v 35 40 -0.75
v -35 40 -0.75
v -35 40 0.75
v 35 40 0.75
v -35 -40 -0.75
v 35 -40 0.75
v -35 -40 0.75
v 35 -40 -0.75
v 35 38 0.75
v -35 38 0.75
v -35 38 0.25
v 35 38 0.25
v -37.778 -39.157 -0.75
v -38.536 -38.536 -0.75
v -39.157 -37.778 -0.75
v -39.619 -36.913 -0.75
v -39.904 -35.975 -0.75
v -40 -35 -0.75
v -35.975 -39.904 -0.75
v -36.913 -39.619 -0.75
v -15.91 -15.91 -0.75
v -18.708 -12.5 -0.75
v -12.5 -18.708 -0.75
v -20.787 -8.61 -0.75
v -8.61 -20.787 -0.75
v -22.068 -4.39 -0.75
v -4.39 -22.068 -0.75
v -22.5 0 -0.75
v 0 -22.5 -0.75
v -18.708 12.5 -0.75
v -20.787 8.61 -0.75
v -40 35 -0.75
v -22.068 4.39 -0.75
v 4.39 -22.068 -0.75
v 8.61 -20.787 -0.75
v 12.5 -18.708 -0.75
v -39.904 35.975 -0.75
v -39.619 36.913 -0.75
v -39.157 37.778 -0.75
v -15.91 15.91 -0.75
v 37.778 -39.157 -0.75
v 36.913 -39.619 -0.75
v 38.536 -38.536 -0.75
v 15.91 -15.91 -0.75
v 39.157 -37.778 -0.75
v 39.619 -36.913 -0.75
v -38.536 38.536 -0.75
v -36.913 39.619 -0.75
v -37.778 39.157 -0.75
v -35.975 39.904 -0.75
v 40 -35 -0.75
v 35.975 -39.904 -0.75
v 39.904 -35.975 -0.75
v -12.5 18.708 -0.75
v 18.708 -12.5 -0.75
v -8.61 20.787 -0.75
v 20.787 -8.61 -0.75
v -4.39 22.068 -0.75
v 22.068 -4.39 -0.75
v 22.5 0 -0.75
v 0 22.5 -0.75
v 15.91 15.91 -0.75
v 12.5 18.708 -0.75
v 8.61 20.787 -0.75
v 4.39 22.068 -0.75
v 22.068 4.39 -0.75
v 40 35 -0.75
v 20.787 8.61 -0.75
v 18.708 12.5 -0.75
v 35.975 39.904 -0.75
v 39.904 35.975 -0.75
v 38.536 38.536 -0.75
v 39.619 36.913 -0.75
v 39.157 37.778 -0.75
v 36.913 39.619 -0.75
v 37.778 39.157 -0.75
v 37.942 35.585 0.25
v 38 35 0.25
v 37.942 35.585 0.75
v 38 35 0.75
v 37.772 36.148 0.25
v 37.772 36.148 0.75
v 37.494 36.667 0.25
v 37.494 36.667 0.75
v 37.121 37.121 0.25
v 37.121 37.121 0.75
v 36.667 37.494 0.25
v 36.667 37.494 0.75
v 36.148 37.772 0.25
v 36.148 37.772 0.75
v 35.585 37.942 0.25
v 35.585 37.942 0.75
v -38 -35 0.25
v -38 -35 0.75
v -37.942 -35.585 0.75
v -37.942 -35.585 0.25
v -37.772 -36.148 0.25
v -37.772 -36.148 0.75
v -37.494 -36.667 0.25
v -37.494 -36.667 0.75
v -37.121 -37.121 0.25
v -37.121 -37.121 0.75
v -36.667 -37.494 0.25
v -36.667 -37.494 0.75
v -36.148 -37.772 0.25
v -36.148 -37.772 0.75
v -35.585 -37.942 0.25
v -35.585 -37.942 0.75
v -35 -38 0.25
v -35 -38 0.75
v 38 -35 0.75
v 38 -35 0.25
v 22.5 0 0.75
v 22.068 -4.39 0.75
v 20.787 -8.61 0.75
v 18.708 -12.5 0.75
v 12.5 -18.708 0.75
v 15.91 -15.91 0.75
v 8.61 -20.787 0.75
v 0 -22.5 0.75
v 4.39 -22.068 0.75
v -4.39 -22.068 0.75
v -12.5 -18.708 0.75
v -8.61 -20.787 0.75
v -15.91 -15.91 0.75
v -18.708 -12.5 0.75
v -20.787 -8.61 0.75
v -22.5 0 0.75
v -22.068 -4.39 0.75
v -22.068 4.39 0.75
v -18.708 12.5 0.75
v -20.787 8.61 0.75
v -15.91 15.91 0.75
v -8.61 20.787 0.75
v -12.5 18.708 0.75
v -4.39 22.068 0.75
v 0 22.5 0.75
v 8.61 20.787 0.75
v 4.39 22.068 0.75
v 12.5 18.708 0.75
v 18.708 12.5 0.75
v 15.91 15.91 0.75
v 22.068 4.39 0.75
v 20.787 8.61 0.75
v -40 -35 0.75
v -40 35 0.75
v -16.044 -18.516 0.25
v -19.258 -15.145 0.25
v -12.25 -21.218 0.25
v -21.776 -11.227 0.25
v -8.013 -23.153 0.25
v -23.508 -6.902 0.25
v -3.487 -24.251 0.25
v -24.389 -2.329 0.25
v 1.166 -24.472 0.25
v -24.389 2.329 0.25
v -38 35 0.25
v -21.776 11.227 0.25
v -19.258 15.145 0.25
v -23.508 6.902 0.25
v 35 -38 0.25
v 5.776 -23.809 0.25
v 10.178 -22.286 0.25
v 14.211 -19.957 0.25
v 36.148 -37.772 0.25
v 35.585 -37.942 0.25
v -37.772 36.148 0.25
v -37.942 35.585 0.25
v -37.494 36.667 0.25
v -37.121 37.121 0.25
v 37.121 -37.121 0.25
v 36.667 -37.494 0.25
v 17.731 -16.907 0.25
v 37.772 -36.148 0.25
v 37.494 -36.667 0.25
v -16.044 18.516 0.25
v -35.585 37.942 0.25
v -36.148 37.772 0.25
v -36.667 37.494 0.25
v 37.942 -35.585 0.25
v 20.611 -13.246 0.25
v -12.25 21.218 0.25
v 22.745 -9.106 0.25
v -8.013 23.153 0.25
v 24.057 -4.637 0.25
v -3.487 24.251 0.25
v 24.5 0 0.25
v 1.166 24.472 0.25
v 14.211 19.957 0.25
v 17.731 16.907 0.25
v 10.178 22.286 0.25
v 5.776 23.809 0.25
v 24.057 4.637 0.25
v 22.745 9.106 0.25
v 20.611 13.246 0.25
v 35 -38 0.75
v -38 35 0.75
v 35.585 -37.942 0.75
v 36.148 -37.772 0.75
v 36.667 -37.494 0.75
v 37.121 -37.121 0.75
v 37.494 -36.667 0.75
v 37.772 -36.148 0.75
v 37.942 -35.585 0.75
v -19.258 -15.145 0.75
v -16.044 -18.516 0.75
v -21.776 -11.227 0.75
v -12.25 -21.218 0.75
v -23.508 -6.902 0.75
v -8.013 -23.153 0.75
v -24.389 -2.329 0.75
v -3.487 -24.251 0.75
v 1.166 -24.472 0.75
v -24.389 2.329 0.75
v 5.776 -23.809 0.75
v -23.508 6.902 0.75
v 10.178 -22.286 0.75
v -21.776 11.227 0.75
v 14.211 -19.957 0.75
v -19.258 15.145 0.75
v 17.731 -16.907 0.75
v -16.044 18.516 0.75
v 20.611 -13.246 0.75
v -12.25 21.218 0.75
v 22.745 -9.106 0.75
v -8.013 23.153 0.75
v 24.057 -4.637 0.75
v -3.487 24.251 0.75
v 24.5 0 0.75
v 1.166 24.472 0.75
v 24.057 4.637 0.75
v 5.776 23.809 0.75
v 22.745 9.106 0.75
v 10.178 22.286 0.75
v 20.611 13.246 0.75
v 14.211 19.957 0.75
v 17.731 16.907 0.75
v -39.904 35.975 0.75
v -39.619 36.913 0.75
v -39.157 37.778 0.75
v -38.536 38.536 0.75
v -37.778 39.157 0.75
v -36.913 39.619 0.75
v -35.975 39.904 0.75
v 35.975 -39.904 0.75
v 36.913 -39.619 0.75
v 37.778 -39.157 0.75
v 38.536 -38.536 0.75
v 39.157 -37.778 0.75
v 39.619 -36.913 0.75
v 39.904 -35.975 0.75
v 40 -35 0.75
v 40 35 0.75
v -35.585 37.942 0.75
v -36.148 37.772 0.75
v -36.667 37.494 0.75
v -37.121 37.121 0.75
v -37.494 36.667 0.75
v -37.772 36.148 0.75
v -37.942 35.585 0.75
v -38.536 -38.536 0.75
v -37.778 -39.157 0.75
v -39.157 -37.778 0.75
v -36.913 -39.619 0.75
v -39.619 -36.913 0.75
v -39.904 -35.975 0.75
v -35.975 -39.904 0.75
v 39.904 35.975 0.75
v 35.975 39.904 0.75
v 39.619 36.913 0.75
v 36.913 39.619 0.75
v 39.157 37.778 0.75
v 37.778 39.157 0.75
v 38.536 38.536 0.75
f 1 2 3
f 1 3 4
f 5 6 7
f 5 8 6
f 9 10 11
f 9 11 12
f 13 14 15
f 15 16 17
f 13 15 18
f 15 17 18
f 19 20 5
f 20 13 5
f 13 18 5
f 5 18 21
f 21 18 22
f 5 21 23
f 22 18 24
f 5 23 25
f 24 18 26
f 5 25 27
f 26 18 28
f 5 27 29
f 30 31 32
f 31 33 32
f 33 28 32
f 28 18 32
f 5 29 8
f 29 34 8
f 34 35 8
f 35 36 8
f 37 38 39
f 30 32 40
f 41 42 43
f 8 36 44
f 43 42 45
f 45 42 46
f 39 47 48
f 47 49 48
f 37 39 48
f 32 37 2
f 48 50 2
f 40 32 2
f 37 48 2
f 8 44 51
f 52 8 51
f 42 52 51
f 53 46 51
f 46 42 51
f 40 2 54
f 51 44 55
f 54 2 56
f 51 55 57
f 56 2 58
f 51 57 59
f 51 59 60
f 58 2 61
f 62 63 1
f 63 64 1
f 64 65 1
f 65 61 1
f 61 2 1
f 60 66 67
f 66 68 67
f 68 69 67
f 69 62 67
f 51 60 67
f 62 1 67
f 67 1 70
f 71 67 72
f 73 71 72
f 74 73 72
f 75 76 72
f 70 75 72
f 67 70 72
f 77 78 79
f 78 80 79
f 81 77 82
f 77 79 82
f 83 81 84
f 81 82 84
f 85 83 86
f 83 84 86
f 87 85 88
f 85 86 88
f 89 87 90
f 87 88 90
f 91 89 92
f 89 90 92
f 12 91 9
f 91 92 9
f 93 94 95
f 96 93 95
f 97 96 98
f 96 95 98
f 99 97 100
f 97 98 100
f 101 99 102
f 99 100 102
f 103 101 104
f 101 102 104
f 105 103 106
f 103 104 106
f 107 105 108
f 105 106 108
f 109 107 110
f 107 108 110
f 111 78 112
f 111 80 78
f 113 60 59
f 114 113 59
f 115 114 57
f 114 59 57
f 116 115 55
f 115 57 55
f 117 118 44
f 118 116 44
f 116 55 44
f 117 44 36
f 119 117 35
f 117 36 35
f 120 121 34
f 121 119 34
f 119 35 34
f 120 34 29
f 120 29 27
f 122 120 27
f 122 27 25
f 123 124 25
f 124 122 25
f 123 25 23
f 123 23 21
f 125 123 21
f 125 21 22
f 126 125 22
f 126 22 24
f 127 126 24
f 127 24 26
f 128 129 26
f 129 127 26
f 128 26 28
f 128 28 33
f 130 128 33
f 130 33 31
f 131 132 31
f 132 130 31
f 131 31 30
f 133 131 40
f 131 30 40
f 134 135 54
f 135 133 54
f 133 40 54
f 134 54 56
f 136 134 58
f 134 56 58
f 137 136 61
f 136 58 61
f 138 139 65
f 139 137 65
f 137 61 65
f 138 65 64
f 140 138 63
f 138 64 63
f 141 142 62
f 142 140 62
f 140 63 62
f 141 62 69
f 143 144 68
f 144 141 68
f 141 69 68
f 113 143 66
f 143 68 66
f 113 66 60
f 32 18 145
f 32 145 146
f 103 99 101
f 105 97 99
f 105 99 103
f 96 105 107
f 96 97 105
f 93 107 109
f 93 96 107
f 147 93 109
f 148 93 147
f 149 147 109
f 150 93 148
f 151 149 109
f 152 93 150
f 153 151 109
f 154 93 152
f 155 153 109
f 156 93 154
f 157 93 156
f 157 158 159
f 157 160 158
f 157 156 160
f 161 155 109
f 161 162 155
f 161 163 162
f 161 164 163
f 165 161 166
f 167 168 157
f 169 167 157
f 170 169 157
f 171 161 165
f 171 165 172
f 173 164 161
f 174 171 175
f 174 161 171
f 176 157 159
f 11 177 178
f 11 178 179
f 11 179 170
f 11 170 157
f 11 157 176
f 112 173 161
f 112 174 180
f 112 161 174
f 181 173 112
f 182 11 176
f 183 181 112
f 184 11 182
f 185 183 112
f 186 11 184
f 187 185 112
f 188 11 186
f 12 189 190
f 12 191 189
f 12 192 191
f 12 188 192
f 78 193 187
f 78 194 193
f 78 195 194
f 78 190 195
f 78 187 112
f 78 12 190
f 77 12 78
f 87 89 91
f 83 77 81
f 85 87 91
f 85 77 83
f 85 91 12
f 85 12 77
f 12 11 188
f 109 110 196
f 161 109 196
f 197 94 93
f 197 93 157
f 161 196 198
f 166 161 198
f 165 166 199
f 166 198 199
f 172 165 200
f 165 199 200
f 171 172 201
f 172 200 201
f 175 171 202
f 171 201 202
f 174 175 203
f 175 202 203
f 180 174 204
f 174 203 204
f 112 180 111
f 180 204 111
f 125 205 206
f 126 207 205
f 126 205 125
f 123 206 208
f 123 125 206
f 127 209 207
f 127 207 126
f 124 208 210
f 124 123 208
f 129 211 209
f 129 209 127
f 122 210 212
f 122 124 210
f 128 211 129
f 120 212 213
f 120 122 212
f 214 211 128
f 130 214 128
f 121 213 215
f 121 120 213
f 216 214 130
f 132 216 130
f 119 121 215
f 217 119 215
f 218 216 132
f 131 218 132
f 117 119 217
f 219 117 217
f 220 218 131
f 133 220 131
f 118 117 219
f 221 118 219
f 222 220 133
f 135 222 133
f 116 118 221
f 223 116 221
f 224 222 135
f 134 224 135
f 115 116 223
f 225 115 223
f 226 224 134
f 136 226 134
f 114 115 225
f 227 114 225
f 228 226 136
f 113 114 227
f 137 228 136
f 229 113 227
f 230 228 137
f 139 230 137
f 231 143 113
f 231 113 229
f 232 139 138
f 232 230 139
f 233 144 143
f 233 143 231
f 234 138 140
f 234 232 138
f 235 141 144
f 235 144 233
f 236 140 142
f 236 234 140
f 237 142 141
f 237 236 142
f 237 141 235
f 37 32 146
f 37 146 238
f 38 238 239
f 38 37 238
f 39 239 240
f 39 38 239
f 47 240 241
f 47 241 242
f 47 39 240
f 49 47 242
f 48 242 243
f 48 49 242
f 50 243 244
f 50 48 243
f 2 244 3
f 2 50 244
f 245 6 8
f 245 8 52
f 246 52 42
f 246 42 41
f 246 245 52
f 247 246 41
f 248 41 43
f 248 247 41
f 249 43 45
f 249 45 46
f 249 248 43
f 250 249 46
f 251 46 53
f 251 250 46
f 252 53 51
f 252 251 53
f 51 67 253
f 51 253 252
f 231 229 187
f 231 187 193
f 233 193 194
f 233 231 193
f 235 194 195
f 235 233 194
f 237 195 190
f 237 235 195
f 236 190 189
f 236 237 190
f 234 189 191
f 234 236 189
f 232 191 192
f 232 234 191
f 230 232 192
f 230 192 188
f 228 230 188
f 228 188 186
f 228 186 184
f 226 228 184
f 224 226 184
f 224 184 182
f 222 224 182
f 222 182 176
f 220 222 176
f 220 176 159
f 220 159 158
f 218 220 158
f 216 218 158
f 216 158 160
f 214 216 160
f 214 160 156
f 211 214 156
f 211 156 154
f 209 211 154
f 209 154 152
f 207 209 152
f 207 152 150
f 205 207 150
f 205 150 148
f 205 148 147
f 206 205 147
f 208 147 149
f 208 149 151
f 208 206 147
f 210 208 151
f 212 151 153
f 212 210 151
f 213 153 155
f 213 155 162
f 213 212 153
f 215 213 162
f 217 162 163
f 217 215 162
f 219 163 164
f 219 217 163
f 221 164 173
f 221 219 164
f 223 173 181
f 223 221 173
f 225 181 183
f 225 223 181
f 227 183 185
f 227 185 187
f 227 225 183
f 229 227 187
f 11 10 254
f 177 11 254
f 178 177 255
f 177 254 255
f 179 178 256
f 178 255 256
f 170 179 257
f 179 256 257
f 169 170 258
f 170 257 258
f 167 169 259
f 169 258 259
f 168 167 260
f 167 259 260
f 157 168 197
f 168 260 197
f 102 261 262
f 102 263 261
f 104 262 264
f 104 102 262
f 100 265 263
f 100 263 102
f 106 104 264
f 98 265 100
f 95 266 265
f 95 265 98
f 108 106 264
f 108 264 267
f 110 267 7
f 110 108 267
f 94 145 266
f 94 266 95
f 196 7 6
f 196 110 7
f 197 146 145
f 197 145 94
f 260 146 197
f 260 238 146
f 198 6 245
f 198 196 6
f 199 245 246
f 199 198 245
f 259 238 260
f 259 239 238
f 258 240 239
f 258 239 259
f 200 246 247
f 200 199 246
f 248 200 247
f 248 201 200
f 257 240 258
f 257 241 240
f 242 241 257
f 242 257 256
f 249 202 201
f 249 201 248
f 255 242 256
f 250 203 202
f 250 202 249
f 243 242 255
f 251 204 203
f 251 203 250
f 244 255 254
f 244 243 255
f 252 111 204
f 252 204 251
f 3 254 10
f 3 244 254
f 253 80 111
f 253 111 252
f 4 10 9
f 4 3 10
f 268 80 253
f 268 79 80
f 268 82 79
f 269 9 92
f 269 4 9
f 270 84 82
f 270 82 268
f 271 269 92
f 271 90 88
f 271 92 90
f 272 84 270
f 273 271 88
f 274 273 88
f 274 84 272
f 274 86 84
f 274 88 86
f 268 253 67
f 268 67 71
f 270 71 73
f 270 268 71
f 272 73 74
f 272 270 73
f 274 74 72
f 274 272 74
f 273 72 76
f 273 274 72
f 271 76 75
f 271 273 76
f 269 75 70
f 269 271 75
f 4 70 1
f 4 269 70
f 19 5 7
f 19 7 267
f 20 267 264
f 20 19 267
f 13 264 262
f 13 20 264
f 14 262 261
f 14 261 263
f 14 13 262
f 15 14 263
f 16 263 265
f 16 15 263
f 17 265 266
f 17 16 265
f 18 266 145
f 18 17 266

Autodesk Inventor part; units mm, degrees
ref_plane "YZ Plane" through (0, 0, 0) normal (1, 0, 0) x (0, 1, 0)
ref_plane "XZ Plane" through (0, 0, 0) normal (0, 1, 0) x (-1, 0, 0)
ref_plane "XY Plane" through (0, 0, 0) normal (0, 0, 1) x (1, 0, 0)
sketch "Schizzo1" plane through (0, 0, 0) normal (0, 0, 1) x (1, 0, 0)
  line L0 (40, -40) -> (-40, -40)
  line L1 (-40, -40) -> (-40, 40)
  line L2 (-40, 40) -> (40, 40)
  line L3 (40, 40) -> (40, -40)
  line L4 (40, -40) -> (-40, 40) construction
  line L5 (-40, -40) -> (40, 40) construction
  circle A0 centre (0, 0) radius 22.5
  dimension "d0" = 80
  dimension "d1" = 80
  dimension "d2" = 45
extrude "Estrusione1" add sketch "Schizzo1" along normal mid plane 1.5
fillet "Raccordo1" radius 5 4 edges at (40, 40, 0) (40, -40, 0) (-40, -40, 0) (-40, 40, 0)
sketch "Schizzo2" plane through (0, 0, 0.75) normal (0, 0, 1) x (1, 0, 0)
  line L0 (35, -40) -> (-35, -40) projected
  line L1 (0, -40) -> (0, -38)
  line L2 (0, -38) -> (35, -38)
  line L3 (0, -38) -> (-35, -38)
  line L4 (-40, -35) -> (-40, 35) projected
  line L5 (-40, 0) -> (-38, 0)
  line L6 (-38, 0) -> (-38, -35)
  arc A0 (-38, -35) -> (-35, -38) centre (-35, -35) ccw
  line L7 (40, 35) -> (40, -35) projected
  line L8 (0, 38) -> (35, 38)
  line L9 (0, 38) -> (-35, 38)
  line L10 (-38, 0) -> (-38, 35)
  arc A1 (-35, 38) -> (-38, 35) centre (-35, 35) ccw
  line L11 (35, 40) -> (-35, 40) projected
  line L12 (38, 0) -> (38, 35)
  arc A2 (38, 35) -> (35, 38) centre (35, 35) ccw
  line L13 (38, 0) -> (38, -35)
  arc A3 (35, -38) -> (38, -35) centre (35, -35) ccw
  circle A4 centre (0, 0) radius 24.5
  dimension "d6" = 2
  dimension "d8" = 35
  dimension "d9" = 35
  dimension "d10" = 2
  dimension "d11" = 35
extrude "Estrusione2" cut sketch "Schizzo2" against normal blind 0.5
